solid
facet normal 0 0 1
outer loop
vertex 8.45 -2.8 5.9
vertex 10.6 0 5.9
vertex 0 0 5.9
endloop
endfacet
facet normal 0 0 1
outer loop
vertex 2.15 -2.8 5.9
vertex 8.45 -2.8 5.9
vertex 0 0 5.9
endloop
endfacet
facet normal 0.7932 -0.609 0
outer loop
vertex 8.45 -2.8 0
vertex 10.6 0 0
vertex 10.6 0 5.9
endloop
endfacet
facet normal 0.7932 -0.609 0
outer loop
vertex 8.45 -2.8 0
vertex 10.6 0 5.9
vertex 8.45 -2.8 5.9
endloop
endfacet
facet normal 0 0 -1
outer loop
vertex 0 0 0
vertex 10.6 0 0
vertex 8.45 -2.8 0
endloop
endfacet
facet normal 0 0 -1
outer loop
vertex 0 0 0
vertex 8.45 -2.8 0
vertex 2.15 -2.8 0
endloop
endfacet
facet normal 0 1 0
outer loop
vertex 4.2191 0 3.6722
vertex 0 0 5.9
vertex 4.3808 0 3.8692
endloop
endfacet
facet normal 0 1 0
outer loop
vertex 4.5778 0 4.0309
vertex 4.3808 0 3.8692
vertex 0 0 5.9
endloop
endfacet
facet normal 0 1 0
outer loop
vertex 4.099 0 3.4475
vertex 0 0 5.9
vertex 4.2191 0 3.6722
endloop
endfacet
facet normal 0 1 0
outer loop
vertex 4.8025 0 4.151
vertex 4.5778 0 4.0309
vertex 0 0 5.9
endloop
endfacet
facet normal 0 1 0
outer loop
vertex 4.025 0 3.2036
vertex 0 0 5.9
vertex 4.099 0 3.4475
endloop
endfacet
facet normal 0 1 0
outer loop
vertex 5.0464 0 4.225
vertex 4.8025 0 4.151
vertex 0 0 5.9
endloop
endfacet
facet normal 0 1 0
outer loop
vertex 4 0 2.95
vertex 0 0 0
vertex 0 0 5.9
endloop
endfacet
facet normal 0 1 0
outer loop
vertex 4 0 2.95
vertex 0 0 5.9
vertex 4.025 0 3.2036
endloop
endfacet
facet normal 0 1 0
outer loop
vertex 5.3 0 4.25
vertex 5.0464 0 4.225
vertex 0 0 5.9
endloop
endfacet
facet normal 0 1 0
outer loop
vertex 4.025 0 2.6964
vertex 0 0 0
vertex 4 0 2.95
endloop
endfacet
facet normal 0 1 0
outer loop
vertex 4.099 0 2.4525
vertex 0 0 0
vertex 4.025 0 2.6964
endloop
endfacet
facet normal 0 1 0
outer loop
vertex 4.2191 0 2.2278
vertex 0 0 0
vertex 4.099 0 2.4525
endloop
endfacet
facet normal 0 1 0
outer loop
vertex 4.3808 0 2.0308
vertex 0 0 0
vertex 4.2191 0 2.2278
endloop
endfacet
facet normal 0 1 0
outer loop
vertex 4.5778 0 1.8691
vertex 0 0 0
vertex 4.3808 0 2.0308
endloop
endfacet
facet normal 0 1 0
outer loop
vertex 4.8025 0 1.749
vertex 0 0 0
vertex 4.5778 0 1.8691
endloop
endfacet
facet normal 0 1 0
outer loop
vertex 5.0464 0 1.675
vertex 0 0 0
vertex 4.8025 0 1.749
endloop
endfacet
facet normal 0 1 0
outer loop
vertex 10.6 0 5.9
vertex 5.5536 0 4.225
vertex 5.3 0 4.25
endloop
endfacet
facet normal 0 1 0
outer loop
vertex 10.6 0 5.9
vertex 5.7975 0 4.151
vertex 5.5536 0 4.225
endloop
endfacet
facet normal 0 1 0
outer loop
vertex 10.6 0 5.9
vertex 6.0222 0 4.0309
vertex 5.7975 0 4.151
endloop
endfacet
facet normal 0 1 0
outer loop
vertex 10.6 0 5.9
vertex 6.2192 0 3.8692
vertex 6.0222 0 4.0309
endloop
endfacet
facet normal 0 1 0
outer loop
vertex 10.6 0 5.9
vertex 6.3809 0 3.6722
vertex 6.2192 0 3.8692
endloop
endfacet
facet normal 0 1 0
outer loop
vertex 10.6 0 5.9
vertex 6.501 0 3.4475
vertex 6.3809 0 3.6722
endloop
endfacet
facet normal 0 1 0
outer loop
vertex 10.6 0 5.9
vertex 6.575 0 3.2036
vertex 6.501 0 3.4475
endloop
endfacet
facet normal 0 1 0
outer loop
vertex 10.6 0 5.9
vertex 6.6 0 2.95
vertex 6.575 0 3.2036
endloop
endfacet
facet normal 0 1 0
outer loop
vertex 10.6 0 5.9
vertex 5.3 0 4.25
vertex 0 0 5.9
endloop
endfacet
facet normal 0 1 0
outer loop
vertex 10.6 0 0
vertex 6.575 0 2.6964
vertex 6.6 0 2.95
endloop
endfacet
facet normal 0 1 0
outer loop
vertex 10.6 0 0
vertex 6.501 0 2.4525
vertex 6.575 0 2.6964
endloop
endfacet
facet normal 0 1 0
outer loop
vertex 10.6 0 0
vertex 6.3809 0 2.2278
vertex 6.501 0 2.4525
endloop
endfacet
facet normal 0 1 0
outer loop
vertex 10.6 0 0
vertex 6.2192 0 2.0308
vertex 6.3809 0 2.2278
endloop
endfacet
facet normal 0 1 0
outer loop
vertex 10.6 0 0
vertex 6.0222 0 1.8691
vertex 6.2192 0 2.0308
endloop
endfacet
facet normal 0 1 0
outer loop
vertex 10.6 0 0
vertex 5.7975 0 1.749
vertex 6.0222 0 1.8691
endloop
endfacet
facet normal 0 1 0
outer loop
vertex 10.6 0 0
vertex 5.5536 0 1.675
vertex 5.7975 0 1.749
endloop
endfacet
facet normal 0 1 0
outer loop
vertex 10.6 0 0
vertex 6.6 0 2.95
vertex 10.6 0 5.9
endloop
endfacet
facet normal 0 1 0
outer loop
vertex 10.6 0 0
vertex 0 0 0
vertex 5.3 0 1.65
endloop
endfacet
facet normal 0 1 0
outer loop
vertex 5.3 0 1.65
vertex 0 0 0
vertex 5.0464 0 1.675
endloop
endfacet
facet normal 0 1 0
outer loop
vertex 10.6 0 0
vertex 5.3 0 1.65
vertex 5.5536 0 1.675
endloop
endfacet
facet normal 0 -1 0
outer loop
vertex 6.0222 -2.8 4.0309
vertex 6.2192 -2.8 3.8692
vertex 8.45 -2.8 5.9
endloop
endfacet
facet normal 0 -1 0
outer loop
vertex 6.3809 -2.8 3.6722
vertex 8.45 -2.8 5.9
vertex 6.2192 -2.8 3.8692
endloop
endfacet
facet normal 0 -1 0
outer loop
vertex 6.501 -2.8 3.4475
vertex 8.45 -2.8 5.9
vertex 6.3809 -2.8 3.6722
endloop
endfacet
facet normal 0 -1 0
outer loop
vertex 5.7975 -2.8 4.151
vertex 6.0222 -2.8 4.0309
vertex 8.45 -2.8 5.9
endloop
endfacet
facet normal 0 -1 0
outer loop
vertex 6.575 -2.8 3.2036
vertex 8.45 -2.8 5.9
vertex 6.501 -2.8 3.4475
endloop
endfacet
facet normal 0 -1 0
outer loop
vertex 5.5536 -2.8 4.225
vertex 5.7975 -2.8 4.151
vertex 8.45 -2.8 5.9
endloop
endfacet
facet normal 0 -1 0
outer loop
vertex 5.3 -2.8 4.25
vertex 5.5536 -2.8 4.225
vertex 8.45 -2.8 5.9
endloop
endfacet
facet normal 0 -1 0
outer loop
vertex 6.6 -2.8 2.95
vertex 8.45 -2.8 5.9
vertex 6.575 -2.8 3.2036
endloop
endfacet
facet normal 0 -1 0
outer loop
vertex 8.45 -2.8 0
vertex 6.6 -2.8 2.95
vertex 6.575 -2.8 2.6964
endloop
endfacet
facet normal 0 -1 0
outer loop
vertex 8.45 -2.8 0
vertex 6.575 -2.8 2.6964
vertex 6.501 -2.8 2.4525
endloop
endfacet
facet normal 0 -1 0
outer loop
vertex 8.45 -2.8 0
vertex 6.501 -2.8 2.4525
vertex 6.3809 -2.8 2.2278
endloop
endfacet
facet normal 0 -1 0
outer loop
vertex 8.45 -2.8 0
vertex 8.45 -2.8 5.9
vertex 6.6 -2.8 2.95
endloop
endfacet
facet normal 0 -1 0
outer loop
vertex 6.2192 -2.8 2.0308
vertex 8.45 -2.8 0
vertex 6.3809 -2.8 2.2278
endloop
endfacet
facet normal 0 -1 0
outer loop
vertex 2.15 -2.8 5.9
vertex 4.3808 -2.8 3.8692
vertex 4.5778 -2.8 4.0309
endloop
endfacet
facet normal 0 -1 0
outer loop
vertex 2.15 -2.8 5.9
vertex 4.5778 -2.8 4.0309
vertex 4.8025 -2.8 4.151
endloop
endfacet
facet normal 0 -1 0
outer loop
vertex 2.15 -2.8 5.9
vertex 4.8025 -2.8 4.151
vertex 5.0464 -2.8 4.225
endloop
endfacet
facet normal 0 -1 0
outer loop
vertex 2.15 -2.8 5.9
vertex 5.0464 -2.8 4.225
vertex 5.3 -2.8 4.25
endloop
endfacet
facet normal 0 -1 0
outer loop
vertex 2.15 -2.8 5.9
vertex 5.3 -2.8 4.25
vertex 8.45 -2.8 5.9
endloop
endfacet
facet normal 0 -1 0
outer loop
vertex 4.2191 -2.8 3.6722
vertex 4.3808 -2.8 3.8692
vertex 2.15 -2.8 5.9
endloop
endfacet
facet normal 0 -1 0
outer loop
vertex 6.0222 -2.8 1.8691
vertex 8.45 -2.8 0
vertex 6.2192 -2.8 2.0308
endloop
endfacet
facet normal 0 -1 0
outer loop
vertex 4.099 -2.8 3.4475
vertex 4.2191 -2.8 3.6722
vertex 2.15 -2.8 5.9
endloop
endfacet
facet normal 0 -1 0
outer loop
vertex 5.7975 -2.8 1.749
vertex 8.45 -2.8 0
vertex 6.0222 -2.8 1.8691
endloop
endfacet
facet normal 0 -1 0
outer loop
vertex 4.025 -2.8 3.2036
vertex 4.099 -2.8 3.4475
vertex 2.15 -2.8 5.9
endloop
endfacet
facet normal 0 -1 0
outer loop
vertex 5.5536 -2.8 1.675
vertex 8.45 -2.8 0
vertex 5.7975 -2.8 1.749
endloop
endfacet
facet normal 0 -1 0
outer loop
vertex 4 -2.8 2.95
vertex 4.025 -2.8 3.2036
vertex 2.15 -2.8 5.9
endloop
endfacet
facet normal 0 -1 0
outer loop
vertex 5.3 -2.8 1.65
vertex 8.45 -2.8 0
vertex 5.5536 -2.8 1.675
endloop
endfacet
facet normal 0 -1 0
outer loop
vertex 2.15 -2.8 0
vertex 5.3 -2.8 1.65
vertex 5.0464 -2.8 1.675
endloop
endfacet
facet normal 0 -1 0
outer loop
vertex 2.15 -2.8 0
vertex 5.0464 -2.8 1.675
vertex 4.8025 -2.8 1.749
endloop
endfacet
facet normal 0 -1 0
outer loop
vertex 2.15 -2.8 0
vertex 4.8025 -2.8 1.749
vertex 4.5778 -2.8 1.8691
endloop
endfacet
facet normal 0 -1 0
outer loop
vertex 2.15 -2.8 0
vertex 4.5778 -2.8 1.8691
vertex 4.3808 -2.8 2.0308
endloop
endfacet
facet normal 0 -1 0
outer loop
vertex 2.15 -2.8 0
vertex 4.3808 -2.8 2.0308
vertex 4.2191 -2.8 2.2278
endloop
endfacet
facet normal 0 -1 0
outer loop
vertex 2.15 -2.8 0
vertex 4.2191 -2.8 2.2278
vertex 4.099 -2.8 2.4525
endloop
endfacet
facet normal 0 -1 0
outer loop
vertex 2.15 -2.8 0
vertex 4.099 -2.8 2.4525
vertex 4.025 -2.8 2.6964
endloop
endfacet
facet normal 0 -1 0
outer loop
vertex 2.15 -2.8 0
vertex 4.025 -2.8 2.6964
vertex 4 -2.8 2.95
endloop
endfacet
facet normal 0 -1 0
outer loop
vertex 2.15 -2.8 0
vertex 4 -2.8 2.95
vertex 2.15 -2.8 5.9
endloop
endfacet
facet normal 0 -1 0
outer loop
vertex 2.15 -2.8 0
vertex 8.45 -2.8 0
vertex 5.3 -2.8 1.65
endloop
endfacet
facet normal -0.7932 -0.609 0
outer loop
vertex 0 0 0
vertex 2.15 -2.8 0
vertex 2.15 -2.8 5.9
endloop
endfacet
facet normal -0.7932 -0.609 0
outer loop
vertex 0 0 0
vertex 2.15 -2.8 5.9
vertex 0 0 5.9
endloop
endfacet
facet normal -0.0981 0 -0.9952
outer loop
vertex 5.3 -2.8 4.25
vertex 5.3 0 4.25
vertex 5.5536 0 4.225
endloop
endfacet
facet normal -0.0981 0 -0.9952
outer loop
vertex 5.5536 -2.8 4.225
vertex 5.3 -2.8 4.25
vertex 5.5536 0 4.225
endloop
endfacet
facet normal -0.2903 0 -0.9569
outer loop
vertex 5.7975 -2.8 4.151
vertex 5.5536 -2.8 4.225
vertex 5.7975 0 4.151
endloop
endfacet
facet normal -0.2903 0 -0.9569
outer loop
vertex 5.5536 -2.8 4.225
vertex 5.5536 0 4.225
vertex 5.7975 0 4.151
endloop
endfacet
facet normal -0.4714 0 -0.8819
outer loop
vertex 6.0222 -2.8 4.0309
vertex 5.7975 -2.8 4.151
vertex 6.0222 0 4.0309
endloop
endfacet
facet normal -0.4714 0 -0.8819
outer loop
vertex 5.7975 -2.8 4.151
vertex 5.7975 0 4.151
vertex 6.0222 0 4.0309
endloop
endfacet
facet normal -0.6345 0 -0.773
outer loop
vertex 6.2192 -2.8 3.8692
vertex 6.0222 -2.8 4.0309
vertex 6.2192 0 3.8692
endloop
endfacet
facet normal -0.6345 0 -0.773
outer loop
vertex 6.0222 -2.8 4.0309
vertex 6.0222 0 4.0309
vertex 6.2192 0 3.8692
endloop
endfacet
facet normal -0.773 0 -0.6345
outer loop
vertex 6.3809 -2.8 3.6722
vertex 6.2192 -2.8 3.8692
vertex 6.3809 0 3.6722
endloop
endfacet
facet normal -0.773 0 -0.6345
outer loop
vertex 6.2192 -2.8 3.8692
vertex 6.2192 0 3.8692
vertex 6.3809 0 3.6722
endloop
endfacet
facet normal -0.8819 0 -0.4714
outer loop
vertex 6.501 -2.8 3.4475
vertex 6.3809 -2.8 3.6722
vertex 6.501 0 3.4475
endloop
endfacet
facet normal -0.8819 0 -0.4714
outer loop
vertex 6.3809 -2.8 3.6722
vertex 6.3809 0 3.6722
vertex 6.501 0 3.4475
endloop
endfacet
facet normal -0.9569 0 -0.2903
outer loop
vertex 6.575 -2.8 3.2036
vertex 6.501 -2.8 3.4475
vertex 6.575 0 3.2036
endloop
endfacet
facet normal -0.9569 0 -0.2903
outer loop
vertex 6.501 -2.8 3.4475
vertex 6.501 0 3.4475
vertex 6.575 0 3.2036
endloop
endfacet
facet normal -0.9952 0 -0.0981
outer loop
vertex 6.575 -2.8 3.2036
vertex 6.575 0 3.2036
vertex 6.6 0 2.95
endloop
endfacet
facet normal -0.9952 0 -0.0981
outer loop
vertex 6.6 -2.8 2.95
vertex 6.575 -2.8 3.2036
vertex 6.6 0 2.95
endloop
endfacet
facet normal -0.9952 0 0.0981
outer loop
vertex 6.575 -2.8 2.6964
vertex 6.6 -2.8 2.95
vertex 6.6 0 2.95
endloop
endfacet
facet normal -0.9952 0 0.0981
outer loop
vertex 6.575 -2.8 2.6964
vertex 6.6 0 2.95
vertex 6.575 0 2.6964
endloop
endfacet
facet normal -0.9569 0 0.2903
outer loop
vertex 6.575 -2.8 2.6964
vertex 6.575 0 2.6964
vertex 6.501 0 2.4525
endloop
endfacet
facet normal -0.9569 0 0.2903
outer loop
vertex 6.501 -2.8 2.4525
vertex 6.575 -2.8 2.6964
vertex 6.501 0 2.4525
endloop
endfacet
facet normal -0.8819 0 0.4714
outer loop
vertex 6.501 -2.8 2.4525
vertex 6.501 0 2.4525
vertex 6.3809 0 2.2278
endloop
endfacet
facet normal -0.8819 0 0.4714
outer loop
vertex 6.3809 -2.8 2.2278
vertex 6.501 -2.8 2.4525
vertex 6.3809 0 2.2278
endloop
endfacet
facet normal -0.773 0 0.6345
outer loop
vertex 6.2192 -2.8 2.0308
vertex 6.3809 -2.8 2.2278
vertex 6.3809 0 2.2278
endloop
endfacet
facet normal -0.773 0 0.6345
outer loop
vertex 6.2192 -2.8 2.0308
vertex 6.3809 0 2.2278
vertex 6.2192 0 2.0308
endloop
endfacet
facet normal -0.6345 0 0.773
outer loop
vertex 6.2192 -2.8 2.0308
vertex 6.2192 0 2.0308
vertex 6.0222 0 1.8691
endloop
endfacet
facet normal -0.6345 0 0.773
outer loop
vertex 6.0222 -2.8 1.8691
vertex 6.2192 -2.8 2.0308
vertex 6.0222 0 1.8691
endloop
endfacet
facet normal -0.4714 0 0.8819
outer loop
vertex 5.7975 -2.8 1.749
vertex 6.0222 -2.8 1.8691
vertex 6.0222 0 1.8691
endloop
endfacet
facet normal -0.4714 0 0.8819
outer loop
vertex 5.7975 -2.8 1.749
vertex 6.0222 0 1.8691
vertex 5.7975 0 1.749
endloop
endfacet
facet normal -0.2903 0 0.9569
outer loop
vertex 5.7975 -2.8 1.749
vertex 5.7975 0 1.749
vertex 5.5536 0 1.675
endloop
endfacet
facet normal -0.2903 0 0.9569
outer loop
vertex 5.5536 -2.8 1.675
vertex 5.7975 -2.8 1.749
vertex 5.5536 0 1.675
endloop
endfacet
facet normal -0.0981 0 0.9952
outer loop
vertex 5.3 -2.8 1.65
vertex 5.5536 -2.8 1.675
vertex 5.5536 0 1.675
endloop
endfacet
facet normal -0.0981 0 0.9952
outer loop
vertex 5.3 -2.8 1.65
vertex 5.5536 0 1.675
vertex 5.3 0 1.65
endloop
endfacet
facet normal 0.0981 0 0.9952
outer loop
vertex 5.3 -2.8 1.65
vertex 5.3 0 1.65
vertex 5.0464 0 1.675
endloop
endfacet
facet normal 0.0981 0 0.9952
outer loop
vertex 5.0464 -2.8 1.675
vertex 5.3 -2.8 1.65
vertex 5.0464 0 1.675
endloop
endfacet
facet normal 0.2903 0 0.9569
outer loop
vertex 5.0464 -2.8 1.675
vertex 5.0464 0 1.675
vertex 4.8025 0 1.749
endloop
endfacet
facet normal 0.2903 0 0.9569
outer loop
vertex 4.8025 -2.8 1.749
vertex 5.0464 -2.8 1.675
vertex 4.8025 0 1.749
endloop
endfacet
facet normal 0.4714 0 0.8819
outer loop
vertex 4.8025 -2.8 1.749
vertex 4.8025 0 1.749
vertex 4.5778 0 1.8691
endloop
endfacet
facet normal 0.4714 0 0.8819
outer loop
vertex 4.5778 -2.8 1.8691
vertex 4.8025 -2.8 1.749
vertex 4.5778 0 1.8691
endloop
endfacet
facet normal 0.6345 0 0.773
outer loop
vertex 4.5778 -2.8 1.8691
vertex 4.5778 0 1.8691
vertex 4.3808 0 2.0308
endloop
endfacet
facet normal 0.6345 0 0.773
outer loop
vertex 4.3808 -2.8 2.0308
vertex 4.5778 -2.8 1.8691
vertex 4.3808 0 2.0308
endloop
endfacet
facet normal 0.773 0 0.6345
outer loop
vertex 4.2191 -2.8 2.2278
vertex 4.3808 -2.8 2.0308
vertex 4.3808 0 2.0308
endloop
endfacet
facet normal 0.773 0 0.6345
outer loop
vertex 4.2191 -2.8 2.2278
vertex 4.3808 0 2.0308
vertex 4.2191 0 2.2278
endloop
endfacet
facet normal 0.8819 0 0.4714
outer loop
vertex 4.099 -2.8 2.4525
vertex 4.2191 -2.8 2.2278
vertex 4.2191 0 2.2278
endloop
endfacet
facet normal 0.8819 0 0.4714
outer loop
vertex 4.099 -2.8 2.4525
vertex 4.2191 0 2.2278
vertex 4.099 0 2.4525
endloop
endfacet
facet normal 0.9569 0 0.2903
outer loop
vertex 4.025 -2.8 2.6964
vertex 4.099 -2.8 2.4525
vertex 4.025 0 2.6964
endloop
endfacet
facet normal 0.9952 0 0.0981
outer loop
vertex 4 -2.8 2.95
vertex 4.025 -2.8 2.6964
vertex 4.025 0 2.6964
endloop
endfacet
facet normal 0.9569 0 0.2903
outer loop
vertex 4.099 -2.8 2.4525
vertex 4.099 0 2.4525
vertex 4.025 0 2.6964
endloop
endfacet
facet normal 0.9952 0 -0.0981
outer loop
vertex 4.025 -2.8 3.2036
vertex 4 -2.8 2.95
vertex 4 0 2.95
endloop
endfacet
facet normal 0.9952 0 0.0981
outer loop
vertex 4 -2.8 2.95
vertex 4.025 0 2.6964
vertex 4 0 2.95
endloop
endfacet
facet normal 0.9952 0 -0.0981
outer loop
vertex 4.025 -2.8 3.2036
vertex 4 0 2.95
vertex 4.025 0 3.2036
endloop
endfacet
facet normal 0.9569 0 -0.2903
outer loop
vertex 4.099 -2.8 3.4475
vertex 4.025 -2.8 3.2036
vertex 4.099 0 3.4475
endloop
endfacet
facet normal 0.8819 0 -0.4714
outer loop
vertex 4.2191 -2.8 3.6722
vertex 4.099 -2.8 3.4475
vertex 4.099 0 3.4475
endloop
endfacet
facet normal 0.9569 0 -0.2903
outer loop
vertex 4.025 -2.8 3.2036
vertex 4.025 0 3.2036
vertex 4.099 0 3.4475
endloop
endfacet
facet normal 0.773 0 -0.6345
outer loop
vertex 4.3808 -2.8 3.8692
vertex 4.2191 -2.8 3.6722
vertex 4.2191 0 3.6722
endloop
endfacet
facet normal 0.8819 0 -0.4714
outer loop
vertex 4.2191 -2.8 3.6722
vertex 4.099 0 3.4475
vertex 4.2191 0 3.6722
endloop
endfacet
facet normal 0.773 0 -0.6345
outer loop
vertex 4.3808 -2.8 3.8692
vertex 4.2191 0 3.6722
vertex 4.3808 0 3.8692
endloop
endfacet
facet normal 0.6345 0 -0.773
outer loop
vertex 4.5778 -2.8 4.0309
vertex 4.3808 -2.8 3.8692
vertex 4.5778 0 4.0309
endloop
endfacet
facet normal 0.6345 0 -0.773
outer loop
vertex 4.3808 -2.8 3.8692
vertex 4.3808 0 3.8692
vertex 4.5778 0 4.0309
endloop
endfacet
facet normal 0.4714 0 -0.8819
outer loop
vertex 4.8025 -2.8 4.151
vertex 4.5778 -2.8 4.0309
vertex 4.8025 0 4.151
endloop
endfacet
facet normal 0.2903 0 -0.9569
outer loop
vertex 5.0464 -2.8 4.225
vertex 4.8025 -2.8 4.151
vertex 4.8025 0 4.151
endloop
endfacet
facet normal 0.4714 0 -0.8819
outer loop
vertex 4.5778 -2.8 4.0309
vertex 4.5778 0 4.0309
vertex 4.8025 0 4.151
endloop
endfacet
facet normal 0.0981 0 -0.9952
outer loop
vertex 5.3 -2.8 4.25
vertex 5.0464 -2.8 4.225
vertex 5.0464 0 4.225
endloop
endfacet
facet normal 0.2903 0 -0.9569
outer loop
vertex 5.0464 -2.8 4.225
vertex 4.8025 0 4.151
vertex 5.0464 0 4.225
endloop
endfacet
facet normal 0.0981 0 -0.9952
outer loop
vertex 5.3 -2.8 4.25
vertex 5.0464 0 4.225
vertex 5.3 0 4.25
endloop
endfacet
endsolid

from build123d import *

# Parameters (mm, degrees)
EXTRUDE_1_DEPTH     = 5.9
SKETCH_2_R          = 1.3
CUT_EXTRUDE_1_DEPTH = 5.9


with BuildPart() as part:
    # 草图1 → 凸台-拉伸1 (new body)
    with BuildSketch(Plane.XY):
        Polygon((0, 0), (10.6, 0), (8.45, -2.8), (2.15, -2.8), align=None)
    extrude(amount=EXTRUDE_1_DEPTH)

    # 草图2 → 切除-拉伸1 (cut)
    with BuildSketch(Plane(origin=(0, 0, 0), x_dir=(1, 0, 0), z_dir=(0, 1, 0))):
        with Locations(Location((5.3, -2.95, 0), (0, 0, 270))):
            Circle(SKETCH_2_R)
    extrude(amount=-CUT_EXTRUDE_1_DEPTH, mode=Mode.SUBTRACT)


solid = part.part
